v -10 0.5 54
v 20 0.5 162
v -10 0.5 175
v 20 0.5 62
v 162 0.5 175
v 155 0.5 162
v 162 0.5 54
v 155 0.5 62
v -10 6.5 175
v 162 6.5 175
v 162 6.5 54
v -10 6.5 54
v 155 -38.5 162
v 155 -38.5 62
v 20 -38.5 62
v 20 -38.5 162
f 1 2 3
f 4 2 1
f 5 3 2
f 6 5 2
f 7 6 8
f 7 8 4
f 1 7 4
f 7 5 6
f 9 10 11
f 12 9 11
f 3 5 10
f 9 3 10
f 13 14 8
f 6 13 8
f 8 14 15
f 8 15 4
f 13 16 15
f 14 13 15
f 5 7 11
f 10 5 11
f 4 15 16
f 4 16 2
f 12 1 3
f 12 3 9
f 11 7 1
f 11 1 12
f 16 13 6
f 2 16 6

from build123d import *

# Parameters (mm, degrees)
BOX168_W                  = 6
BOX168_H                  = 121
BOX168_DEPTH              = 172
BOX169_W                  = 40
BOX169_H                  = 100
BOX169_DEPTH              = 135
FUSION057_ROLL_ANGLE      = -90
FUSION057_PLACEMENT_ANGLE = 90


with BuildPart() as cube128:
    # Box168 → Box168 (new body)
    with BuildSketch(Plane.XY):
        with Locations((3, 60.5)):
            Rectangle(BOX168_W, BOX168_H)
    extrude(amount=BOX168_DEPTH)


with BuildPart() as f_120_roll_holder:
    # Box169 → Box169 (new body)
    with BuildSketch(Plane(origin=(-39, 13, 7), x_dir=(1, 0, 0), z_dir=(0, 0, 1))):
        with Locations((20, 50)):
            Rectangle(BOX169_W, BOX169_H)
    extrude(amount=BOX169_DEPTH)

    # Fusion057: union Cube128
    add(cube128.part)


with BuildPart() as f_120_roll_holder_1:
    # Fusion057 roll: moved
    add(f_120_roll_holder.part.rotate(Axis((0, 0, 0), (1, 0, 0)), FUSION057_ROLL_ANGLE))


with BuildPart() as f_120_roll_holder_2:
    # Fusion057 placement: moved
    add(f_120_roll_holder_1.part.moved(Location((162, 0.5, 175))).rotate(Axis((162, 0.5, 175), (0, 0, 1)), FUSION057_PLACEMENT_ANGLE))


solid = f_120_roll_holder_2.part
